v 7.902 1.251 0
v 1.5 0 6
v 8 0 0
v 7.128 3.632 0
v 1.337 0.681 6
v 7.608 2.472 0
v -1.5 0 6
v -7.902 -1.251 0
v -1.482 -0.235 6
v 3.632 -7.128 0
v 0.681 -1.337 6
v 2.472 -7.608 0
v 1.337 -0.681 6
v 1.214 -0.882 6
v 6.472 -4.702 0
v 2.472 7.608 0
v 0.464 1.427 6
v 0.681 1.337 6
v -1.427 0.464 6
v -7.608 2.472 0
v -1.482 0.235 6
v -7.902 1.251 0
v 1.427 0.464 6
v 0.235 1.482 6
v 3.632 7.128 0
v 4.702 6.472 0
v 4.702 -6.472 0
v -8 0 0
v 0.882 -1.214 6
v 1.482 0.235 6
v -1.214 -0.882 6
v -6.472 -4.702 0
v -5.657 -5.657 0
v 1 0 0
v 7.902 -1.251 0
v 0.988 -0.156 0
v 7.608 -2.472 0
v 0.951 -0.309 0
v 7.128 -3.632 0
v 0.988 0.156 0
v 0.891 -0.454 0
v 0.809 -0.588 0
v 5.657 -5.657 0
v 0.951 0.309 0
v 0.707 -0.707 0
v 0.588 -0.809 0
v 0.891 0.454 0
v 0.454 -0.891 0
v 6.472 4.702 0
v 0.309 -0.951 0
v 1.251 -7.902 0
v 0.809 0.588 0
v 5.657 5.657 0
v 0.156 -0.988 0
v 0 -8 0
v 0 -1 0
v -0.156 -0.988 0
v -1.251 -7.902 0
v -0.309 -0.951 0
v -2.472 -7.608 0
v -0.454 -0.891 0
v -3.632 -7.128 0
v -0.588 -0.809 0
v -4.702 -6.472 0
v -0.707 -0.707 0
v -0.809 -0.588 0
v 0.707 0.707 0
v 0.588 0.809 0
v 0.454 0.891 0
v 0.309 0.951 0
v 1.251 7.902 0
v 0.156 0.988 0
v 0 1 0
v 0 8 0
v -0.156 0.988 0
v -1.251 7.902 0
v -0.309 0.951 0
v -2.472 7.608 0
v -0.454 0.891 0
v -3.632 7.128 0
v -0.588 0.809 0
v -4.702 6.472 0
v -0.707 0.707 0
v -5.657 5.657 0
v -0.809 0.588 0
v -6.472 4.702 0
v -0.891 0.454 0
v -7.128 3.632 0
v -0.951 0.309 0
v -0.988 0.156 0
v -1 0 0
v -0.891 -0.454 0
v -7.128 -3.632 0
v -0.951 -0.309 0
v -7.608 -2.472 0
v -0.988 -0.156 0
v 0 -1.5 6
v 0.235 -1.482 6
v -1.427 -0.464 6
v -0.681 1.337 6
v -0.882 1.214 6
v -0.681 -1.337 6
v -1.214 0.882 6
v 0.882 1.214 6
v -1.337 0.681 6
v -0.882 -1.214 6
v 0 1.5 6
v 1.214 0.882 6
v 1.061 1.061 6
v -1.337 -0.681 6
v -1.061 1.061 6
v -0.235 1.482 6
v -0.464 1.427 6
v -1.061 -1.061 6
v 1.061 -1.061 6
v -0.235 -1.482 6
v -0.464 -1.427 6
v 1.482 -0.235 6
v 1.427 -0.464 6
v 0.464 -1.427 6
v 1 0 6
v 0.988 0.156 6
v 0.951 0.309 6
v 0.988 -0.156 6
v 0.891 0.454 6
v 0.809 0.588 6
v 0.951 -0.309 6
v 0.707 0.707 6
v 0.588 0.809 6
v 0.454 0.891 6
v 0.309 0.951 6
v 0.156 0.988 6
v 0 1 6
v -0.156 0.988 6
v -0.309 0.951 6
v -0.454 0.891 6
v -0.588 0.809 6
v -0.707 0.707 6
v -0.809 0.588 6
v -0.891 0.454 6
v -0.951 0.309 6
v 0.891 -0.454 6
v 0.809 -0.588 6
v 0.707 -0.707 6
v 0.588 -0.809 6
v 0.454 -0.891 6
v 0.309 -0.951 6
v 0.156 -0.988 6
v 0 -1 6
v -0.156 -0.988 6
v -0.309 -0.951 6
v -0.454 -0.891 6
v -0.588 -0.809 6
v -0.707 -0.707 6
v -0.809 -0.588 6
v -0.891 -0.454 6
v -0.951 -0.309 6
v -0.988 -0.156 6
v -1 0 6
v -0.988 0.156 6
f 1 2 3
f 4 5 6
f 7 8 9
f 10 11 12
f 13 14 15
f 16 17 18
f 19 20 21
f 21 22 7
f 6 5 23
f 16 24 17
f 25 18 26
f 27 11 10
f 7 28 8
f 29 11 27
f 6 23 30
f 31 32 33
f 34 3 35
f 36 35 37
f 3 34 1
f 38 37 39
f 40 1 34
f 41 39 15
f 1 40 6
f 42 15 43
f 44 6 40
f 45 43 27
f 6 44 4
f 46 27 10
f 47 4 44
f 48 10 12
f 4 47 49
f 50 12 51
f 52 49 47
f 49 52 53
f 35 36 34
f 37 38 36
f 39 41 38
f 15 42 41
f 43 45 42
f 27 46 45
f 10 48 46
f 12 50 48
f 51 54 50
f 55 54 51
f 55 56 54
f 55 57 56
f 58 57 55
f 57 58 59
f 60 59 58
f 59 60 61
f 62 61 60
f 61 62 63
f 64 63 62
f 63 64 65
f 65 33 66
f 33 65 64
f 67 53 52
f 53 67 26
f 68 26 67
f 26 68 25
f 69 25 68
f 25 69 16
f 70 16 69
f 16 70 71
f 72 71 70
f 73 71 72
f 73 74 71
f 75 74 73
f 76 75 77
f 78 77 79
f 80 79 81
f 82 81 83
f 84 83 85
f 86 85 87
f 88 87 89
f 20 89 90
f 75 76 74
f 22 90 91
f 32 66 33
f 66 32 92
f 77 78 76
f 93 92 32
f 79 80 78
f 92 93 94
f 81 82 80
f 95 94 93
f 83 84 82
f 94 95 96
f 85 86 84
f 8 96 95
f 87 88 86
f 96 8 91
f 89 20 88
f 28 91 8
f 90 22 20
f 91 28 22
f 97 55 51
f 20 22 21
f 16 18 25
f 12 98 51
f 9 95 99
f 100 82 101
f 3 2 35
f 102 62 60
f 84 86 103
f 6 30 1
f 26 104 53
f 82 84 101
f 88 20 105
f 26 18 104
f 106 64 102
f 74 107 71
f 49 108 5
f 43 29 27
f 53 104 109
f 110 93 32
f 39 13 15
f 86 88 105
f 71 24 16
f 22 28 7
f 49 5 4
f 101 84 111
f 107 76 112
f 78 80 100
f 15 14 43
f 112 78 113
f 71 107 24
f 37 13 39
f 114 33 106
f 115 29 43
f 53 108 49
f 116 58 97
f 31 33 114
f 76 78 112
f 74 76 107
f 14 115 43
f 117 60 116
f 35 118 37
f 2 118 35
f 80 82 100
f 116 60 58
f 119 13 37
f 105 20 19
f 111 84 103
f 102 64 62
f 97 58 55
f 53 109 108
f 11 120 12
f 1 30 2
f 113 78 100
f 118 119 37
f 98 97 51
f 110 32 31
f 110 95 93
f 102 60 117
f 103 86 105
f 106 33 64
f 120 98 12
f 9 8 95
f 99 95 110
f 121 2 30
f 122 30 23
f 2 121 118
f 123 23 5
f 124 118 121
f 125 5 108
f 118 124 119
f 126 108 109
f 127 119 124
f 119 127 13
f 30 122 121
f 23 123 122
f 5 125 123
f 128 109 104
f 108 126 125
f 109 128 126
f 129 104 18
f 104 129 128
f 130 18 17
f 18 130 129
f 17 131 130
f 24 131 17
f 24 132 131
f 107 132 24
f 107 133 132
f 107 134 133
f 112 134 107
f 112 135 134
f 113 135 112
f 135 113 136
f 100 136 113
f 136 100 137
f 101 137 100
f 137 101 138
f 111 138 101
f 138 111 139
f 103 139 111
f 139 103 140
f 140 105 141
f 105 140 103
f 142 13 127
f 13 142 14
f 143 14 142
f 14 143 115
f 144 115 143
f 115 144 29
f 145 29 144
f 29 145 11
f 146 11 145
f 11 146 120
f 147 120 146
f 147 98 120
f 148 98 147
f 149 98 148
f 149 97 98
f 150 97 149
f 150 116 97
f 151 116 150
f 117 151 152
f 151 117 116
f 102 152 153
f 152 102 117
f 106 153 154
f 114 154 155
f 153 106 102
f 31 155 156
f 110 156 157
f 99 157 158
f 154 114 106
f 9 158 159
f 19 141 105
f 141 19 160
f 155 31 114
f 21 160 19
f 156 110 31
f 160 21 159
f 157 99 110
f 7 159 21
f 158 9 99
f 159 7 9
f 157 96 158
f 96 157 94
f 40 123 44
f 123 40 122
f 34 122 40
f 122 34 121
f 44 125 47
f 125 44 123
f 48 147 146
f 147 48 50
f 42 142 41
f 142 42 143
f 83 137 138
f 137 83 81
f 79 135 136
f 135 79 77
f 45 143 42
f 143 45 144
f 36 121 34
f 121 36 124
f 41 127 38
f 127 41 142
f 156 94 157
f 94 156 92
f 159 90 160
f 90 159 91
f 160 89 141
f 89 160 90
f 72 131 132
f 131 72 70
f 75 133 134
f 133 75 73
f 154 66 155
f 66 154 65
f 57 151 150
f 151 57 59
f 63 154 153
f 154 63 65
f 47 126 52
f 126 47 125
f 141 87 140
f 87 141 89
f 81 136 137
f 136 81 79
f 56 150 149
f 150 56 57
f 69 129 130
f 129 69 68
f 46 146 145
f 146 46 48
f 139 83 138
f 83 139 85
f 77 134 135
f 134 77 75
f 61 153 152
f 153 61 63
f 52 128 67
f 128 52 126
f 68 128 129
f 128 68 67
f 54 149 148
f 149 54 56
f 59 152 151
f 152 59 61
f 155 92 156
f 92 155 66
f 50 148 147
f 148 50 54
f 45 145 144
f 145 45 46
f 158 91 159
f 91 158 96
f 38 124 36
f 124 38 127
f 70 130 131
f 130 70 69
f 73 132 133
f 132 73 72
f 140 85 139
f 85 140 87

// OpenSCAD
//bottom radius
r1=8;
//top radius
r2=1.5;
//hole radius
r3=1;
//height
h=6;

difference(){
	cylinder(r1=r1,r2=r2,h=h,$fn=40);
	translate([0,0,-0.05])
		cylinder(r=r3,h=h+0.1,$fn=40);
}
